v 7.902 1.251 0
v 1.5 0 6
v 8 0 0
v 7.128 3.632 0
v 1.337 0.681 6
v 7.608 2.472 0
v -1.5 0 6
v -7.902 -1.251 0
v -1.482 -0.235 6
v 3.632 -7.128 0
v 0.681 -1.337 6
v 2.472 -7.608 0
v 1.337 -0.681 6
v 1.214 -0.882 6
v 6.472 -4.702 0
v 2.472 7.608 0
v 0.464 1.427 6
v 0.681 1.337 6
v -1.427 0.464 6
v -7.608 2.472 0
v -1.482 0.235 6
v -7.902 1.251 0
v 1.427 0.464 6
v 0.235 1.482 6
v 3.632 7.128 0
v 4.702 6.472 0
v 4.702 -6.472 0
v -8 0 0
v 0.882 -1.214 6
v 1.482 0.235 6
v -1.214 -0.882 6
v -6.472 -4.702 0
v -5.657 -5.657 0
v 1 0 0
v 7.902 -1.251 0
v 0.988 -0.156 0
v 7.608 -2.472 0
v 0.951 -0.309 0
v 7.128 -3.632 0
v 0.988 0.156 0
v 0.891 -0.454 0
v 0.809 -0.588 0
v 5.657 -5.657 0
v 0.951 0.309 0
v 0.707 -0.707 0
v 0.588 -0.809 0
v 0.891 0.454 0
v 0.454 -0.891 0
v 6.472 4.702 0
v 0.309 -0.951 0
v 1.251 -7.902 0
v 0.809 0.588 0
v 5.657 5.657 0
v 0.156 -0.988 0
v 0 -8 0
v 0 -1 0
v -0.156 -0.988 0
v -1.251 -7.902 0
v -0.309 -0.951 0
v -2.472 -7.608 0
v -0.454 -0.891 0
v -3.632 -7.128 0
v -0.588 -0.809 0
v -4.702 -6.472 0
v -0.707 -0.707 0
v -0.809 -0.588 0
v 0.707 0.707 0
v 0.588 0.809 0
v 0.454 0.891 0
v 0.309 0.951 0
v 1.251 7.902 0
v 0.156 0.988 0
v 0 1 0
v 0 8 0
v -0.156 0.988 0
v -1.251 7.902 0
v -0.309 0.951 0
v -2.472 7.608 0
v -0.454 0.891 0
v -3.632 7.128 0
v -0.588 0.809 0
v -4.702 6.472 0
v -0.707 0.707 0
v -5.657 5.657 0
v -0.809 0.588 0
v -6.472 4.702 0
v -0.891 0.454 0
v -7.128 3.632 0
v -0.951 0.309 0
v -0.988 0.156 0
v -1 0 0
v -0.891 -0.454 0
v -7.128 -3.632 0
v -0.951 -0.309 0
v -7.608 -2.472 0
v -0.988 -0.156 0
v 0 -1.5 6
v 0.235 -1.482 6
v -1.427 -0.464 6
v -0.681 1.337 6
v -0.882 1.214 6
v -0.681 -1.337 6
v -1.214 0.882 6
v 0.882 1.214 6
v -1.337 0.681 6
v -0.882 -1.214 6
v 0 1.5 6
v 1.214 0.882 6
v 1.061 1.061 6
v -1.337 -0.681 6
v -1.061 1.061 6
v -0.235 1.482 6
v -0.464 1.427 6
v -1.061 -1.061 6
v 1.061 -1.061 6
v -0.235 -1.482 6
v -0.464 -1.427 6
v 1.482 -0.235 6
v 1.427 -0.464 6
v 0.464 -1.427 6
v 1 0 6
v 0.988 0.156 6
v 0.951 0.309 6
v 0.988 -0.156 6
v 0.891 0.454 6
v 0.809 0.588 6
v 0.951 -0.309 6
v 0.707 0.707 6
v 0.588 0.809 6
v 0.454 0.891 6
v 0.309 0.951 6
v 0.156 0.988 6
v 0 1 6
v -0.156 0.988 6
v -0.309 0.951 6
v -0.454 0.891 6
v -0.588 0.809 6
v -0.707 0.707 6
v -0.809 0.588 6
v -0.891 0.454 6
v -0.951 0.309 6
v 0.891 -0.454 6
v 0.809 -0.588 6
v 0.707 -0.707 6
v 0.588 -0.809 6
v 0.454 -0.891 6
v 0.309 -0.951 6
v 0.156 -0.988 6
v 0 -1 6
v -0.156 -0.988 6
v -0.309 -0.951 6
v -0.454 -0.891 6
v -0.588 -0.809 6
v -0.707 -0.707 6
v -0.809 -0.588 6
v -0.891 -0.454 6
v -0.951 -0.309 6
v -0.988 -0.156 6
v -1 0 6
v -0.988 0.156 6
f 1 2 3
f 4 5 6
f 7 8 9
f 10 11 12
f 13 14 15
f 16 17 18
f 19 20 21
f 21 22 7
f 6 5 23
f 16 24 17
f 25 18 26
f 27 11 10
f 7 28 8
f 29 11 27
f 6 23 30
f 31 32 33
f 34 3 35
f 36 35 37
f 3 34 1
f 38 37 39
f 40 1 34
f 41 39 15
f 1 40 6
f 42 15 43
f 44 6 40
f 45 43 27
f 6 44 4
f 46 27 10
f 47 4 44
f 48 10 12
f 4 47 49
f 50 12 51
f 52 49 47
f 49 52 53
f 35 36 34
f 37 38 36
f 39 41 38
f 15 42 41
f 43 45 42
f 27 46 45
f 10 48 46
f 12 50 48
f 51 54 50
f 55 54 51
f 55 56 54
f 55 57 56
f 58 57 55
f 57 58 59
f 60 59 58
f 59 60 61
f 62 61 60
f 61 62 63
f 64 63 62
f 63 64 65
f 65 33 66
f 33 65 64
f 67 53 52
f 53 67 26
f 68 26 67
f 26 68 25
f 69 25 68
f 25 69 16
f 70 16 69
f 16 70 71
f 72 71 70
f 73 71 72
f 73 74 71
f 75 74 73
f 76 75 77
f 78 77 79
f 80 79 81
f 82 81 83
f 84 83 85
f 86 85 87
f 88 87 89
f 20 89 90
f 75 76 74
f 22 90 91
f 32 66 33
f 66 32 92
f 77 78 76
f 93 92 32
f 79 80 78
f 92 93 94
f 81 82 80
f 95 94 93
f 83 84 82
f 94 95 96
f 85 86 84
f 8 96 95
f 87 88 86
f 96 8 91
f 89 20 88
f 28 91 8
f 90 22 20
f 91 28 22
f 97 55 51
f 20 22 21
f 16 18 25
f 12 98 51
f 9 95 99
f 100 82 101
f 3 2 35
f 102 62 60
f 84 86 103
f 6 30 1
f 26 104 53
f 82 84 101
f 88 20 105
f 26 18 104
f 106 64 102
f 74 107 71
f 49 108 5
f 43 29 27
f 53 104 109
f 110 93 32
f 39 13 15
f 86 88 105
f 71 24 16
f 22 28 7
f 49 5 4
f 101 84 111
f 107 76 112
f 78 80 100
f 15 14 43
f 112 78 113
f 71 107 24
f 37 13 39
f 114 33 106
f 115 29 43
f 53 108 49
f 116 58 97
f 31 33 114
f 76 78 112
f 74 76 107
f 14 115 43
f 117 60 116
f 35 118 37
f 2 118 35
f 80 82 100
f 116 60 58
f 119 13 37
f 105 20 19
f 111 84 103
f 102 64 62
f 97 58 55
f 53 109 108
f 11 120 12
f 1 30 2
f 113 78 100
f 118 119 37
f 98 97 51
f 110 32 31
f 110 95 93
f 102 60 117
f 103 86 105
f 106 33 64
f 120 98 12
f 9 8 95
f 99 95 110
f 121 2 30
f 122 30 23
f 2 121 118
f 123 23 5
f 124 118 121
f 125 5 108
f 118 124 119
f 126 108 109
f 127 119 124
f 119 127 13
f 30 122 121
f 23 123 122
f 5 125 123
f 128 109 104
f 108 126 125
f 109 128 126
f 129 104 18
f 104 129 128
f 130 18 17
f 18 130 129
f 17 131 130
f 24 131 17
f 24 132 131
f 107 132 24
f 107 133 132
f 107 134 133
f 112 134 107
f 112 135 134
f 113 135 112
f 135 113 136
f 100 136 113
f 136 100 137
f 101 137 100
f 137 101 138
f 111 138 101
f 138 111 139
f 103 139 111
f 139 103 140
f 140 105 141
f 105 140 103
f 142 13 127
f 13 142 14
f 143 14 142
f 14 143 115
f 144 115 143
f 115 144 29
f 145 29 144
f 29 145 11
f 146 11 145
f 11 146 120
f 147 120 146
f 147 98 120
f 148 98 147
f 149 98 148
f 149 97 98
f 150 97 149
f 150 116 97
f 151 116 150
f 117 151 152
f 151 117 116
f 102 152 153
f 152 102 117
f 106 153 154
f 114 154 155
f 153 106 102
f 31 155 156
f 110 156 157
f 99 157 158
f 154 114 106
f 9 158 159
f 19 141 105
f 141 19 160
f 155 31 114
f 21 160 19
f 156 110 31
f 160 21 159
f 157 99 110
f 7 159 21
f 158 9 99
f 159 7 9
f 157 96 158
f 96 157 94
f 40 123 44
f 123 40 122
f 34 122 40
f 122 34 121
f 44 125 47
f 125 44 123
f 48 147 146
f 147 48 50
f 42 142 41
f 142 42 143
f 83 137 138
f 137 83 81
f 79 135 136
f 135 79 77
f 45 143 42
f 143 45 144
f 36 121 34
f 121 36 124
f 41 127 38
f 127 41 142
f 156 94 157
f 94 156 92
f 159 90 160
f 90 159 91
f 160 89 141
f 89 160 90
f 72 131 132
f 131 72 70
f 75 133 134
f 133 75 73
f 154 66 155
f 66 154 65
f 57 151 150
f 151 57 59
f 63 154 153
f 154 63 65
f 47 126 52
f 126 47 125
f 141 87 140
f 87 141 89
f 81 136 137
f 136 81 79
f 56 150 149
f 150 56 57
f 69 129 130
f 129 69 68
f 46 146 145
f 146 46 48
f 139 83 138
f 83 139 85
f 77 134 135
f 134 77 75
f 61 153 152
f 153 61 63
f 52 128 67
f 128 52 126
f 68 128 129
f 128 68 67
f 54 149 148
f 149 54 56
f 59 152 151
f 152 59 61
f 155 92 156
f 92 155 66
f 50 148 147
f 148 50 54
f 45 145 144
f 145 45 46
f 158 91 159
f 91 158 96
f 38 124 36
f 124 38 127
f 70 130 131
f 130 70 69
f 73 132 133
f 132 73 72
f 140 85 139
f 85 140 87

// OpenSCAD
//bottom radius
r1=8;
//top radius
r2=1.5;
//hole radius
r3=1;
//height
h=6;

difference(){
	cylinder(r1=r1,r2=r2,h=h,$fn=40);
	translate([0,0,-0.05])
		cylinder(r=r3,h=h+0.1,$fn=40);
}
